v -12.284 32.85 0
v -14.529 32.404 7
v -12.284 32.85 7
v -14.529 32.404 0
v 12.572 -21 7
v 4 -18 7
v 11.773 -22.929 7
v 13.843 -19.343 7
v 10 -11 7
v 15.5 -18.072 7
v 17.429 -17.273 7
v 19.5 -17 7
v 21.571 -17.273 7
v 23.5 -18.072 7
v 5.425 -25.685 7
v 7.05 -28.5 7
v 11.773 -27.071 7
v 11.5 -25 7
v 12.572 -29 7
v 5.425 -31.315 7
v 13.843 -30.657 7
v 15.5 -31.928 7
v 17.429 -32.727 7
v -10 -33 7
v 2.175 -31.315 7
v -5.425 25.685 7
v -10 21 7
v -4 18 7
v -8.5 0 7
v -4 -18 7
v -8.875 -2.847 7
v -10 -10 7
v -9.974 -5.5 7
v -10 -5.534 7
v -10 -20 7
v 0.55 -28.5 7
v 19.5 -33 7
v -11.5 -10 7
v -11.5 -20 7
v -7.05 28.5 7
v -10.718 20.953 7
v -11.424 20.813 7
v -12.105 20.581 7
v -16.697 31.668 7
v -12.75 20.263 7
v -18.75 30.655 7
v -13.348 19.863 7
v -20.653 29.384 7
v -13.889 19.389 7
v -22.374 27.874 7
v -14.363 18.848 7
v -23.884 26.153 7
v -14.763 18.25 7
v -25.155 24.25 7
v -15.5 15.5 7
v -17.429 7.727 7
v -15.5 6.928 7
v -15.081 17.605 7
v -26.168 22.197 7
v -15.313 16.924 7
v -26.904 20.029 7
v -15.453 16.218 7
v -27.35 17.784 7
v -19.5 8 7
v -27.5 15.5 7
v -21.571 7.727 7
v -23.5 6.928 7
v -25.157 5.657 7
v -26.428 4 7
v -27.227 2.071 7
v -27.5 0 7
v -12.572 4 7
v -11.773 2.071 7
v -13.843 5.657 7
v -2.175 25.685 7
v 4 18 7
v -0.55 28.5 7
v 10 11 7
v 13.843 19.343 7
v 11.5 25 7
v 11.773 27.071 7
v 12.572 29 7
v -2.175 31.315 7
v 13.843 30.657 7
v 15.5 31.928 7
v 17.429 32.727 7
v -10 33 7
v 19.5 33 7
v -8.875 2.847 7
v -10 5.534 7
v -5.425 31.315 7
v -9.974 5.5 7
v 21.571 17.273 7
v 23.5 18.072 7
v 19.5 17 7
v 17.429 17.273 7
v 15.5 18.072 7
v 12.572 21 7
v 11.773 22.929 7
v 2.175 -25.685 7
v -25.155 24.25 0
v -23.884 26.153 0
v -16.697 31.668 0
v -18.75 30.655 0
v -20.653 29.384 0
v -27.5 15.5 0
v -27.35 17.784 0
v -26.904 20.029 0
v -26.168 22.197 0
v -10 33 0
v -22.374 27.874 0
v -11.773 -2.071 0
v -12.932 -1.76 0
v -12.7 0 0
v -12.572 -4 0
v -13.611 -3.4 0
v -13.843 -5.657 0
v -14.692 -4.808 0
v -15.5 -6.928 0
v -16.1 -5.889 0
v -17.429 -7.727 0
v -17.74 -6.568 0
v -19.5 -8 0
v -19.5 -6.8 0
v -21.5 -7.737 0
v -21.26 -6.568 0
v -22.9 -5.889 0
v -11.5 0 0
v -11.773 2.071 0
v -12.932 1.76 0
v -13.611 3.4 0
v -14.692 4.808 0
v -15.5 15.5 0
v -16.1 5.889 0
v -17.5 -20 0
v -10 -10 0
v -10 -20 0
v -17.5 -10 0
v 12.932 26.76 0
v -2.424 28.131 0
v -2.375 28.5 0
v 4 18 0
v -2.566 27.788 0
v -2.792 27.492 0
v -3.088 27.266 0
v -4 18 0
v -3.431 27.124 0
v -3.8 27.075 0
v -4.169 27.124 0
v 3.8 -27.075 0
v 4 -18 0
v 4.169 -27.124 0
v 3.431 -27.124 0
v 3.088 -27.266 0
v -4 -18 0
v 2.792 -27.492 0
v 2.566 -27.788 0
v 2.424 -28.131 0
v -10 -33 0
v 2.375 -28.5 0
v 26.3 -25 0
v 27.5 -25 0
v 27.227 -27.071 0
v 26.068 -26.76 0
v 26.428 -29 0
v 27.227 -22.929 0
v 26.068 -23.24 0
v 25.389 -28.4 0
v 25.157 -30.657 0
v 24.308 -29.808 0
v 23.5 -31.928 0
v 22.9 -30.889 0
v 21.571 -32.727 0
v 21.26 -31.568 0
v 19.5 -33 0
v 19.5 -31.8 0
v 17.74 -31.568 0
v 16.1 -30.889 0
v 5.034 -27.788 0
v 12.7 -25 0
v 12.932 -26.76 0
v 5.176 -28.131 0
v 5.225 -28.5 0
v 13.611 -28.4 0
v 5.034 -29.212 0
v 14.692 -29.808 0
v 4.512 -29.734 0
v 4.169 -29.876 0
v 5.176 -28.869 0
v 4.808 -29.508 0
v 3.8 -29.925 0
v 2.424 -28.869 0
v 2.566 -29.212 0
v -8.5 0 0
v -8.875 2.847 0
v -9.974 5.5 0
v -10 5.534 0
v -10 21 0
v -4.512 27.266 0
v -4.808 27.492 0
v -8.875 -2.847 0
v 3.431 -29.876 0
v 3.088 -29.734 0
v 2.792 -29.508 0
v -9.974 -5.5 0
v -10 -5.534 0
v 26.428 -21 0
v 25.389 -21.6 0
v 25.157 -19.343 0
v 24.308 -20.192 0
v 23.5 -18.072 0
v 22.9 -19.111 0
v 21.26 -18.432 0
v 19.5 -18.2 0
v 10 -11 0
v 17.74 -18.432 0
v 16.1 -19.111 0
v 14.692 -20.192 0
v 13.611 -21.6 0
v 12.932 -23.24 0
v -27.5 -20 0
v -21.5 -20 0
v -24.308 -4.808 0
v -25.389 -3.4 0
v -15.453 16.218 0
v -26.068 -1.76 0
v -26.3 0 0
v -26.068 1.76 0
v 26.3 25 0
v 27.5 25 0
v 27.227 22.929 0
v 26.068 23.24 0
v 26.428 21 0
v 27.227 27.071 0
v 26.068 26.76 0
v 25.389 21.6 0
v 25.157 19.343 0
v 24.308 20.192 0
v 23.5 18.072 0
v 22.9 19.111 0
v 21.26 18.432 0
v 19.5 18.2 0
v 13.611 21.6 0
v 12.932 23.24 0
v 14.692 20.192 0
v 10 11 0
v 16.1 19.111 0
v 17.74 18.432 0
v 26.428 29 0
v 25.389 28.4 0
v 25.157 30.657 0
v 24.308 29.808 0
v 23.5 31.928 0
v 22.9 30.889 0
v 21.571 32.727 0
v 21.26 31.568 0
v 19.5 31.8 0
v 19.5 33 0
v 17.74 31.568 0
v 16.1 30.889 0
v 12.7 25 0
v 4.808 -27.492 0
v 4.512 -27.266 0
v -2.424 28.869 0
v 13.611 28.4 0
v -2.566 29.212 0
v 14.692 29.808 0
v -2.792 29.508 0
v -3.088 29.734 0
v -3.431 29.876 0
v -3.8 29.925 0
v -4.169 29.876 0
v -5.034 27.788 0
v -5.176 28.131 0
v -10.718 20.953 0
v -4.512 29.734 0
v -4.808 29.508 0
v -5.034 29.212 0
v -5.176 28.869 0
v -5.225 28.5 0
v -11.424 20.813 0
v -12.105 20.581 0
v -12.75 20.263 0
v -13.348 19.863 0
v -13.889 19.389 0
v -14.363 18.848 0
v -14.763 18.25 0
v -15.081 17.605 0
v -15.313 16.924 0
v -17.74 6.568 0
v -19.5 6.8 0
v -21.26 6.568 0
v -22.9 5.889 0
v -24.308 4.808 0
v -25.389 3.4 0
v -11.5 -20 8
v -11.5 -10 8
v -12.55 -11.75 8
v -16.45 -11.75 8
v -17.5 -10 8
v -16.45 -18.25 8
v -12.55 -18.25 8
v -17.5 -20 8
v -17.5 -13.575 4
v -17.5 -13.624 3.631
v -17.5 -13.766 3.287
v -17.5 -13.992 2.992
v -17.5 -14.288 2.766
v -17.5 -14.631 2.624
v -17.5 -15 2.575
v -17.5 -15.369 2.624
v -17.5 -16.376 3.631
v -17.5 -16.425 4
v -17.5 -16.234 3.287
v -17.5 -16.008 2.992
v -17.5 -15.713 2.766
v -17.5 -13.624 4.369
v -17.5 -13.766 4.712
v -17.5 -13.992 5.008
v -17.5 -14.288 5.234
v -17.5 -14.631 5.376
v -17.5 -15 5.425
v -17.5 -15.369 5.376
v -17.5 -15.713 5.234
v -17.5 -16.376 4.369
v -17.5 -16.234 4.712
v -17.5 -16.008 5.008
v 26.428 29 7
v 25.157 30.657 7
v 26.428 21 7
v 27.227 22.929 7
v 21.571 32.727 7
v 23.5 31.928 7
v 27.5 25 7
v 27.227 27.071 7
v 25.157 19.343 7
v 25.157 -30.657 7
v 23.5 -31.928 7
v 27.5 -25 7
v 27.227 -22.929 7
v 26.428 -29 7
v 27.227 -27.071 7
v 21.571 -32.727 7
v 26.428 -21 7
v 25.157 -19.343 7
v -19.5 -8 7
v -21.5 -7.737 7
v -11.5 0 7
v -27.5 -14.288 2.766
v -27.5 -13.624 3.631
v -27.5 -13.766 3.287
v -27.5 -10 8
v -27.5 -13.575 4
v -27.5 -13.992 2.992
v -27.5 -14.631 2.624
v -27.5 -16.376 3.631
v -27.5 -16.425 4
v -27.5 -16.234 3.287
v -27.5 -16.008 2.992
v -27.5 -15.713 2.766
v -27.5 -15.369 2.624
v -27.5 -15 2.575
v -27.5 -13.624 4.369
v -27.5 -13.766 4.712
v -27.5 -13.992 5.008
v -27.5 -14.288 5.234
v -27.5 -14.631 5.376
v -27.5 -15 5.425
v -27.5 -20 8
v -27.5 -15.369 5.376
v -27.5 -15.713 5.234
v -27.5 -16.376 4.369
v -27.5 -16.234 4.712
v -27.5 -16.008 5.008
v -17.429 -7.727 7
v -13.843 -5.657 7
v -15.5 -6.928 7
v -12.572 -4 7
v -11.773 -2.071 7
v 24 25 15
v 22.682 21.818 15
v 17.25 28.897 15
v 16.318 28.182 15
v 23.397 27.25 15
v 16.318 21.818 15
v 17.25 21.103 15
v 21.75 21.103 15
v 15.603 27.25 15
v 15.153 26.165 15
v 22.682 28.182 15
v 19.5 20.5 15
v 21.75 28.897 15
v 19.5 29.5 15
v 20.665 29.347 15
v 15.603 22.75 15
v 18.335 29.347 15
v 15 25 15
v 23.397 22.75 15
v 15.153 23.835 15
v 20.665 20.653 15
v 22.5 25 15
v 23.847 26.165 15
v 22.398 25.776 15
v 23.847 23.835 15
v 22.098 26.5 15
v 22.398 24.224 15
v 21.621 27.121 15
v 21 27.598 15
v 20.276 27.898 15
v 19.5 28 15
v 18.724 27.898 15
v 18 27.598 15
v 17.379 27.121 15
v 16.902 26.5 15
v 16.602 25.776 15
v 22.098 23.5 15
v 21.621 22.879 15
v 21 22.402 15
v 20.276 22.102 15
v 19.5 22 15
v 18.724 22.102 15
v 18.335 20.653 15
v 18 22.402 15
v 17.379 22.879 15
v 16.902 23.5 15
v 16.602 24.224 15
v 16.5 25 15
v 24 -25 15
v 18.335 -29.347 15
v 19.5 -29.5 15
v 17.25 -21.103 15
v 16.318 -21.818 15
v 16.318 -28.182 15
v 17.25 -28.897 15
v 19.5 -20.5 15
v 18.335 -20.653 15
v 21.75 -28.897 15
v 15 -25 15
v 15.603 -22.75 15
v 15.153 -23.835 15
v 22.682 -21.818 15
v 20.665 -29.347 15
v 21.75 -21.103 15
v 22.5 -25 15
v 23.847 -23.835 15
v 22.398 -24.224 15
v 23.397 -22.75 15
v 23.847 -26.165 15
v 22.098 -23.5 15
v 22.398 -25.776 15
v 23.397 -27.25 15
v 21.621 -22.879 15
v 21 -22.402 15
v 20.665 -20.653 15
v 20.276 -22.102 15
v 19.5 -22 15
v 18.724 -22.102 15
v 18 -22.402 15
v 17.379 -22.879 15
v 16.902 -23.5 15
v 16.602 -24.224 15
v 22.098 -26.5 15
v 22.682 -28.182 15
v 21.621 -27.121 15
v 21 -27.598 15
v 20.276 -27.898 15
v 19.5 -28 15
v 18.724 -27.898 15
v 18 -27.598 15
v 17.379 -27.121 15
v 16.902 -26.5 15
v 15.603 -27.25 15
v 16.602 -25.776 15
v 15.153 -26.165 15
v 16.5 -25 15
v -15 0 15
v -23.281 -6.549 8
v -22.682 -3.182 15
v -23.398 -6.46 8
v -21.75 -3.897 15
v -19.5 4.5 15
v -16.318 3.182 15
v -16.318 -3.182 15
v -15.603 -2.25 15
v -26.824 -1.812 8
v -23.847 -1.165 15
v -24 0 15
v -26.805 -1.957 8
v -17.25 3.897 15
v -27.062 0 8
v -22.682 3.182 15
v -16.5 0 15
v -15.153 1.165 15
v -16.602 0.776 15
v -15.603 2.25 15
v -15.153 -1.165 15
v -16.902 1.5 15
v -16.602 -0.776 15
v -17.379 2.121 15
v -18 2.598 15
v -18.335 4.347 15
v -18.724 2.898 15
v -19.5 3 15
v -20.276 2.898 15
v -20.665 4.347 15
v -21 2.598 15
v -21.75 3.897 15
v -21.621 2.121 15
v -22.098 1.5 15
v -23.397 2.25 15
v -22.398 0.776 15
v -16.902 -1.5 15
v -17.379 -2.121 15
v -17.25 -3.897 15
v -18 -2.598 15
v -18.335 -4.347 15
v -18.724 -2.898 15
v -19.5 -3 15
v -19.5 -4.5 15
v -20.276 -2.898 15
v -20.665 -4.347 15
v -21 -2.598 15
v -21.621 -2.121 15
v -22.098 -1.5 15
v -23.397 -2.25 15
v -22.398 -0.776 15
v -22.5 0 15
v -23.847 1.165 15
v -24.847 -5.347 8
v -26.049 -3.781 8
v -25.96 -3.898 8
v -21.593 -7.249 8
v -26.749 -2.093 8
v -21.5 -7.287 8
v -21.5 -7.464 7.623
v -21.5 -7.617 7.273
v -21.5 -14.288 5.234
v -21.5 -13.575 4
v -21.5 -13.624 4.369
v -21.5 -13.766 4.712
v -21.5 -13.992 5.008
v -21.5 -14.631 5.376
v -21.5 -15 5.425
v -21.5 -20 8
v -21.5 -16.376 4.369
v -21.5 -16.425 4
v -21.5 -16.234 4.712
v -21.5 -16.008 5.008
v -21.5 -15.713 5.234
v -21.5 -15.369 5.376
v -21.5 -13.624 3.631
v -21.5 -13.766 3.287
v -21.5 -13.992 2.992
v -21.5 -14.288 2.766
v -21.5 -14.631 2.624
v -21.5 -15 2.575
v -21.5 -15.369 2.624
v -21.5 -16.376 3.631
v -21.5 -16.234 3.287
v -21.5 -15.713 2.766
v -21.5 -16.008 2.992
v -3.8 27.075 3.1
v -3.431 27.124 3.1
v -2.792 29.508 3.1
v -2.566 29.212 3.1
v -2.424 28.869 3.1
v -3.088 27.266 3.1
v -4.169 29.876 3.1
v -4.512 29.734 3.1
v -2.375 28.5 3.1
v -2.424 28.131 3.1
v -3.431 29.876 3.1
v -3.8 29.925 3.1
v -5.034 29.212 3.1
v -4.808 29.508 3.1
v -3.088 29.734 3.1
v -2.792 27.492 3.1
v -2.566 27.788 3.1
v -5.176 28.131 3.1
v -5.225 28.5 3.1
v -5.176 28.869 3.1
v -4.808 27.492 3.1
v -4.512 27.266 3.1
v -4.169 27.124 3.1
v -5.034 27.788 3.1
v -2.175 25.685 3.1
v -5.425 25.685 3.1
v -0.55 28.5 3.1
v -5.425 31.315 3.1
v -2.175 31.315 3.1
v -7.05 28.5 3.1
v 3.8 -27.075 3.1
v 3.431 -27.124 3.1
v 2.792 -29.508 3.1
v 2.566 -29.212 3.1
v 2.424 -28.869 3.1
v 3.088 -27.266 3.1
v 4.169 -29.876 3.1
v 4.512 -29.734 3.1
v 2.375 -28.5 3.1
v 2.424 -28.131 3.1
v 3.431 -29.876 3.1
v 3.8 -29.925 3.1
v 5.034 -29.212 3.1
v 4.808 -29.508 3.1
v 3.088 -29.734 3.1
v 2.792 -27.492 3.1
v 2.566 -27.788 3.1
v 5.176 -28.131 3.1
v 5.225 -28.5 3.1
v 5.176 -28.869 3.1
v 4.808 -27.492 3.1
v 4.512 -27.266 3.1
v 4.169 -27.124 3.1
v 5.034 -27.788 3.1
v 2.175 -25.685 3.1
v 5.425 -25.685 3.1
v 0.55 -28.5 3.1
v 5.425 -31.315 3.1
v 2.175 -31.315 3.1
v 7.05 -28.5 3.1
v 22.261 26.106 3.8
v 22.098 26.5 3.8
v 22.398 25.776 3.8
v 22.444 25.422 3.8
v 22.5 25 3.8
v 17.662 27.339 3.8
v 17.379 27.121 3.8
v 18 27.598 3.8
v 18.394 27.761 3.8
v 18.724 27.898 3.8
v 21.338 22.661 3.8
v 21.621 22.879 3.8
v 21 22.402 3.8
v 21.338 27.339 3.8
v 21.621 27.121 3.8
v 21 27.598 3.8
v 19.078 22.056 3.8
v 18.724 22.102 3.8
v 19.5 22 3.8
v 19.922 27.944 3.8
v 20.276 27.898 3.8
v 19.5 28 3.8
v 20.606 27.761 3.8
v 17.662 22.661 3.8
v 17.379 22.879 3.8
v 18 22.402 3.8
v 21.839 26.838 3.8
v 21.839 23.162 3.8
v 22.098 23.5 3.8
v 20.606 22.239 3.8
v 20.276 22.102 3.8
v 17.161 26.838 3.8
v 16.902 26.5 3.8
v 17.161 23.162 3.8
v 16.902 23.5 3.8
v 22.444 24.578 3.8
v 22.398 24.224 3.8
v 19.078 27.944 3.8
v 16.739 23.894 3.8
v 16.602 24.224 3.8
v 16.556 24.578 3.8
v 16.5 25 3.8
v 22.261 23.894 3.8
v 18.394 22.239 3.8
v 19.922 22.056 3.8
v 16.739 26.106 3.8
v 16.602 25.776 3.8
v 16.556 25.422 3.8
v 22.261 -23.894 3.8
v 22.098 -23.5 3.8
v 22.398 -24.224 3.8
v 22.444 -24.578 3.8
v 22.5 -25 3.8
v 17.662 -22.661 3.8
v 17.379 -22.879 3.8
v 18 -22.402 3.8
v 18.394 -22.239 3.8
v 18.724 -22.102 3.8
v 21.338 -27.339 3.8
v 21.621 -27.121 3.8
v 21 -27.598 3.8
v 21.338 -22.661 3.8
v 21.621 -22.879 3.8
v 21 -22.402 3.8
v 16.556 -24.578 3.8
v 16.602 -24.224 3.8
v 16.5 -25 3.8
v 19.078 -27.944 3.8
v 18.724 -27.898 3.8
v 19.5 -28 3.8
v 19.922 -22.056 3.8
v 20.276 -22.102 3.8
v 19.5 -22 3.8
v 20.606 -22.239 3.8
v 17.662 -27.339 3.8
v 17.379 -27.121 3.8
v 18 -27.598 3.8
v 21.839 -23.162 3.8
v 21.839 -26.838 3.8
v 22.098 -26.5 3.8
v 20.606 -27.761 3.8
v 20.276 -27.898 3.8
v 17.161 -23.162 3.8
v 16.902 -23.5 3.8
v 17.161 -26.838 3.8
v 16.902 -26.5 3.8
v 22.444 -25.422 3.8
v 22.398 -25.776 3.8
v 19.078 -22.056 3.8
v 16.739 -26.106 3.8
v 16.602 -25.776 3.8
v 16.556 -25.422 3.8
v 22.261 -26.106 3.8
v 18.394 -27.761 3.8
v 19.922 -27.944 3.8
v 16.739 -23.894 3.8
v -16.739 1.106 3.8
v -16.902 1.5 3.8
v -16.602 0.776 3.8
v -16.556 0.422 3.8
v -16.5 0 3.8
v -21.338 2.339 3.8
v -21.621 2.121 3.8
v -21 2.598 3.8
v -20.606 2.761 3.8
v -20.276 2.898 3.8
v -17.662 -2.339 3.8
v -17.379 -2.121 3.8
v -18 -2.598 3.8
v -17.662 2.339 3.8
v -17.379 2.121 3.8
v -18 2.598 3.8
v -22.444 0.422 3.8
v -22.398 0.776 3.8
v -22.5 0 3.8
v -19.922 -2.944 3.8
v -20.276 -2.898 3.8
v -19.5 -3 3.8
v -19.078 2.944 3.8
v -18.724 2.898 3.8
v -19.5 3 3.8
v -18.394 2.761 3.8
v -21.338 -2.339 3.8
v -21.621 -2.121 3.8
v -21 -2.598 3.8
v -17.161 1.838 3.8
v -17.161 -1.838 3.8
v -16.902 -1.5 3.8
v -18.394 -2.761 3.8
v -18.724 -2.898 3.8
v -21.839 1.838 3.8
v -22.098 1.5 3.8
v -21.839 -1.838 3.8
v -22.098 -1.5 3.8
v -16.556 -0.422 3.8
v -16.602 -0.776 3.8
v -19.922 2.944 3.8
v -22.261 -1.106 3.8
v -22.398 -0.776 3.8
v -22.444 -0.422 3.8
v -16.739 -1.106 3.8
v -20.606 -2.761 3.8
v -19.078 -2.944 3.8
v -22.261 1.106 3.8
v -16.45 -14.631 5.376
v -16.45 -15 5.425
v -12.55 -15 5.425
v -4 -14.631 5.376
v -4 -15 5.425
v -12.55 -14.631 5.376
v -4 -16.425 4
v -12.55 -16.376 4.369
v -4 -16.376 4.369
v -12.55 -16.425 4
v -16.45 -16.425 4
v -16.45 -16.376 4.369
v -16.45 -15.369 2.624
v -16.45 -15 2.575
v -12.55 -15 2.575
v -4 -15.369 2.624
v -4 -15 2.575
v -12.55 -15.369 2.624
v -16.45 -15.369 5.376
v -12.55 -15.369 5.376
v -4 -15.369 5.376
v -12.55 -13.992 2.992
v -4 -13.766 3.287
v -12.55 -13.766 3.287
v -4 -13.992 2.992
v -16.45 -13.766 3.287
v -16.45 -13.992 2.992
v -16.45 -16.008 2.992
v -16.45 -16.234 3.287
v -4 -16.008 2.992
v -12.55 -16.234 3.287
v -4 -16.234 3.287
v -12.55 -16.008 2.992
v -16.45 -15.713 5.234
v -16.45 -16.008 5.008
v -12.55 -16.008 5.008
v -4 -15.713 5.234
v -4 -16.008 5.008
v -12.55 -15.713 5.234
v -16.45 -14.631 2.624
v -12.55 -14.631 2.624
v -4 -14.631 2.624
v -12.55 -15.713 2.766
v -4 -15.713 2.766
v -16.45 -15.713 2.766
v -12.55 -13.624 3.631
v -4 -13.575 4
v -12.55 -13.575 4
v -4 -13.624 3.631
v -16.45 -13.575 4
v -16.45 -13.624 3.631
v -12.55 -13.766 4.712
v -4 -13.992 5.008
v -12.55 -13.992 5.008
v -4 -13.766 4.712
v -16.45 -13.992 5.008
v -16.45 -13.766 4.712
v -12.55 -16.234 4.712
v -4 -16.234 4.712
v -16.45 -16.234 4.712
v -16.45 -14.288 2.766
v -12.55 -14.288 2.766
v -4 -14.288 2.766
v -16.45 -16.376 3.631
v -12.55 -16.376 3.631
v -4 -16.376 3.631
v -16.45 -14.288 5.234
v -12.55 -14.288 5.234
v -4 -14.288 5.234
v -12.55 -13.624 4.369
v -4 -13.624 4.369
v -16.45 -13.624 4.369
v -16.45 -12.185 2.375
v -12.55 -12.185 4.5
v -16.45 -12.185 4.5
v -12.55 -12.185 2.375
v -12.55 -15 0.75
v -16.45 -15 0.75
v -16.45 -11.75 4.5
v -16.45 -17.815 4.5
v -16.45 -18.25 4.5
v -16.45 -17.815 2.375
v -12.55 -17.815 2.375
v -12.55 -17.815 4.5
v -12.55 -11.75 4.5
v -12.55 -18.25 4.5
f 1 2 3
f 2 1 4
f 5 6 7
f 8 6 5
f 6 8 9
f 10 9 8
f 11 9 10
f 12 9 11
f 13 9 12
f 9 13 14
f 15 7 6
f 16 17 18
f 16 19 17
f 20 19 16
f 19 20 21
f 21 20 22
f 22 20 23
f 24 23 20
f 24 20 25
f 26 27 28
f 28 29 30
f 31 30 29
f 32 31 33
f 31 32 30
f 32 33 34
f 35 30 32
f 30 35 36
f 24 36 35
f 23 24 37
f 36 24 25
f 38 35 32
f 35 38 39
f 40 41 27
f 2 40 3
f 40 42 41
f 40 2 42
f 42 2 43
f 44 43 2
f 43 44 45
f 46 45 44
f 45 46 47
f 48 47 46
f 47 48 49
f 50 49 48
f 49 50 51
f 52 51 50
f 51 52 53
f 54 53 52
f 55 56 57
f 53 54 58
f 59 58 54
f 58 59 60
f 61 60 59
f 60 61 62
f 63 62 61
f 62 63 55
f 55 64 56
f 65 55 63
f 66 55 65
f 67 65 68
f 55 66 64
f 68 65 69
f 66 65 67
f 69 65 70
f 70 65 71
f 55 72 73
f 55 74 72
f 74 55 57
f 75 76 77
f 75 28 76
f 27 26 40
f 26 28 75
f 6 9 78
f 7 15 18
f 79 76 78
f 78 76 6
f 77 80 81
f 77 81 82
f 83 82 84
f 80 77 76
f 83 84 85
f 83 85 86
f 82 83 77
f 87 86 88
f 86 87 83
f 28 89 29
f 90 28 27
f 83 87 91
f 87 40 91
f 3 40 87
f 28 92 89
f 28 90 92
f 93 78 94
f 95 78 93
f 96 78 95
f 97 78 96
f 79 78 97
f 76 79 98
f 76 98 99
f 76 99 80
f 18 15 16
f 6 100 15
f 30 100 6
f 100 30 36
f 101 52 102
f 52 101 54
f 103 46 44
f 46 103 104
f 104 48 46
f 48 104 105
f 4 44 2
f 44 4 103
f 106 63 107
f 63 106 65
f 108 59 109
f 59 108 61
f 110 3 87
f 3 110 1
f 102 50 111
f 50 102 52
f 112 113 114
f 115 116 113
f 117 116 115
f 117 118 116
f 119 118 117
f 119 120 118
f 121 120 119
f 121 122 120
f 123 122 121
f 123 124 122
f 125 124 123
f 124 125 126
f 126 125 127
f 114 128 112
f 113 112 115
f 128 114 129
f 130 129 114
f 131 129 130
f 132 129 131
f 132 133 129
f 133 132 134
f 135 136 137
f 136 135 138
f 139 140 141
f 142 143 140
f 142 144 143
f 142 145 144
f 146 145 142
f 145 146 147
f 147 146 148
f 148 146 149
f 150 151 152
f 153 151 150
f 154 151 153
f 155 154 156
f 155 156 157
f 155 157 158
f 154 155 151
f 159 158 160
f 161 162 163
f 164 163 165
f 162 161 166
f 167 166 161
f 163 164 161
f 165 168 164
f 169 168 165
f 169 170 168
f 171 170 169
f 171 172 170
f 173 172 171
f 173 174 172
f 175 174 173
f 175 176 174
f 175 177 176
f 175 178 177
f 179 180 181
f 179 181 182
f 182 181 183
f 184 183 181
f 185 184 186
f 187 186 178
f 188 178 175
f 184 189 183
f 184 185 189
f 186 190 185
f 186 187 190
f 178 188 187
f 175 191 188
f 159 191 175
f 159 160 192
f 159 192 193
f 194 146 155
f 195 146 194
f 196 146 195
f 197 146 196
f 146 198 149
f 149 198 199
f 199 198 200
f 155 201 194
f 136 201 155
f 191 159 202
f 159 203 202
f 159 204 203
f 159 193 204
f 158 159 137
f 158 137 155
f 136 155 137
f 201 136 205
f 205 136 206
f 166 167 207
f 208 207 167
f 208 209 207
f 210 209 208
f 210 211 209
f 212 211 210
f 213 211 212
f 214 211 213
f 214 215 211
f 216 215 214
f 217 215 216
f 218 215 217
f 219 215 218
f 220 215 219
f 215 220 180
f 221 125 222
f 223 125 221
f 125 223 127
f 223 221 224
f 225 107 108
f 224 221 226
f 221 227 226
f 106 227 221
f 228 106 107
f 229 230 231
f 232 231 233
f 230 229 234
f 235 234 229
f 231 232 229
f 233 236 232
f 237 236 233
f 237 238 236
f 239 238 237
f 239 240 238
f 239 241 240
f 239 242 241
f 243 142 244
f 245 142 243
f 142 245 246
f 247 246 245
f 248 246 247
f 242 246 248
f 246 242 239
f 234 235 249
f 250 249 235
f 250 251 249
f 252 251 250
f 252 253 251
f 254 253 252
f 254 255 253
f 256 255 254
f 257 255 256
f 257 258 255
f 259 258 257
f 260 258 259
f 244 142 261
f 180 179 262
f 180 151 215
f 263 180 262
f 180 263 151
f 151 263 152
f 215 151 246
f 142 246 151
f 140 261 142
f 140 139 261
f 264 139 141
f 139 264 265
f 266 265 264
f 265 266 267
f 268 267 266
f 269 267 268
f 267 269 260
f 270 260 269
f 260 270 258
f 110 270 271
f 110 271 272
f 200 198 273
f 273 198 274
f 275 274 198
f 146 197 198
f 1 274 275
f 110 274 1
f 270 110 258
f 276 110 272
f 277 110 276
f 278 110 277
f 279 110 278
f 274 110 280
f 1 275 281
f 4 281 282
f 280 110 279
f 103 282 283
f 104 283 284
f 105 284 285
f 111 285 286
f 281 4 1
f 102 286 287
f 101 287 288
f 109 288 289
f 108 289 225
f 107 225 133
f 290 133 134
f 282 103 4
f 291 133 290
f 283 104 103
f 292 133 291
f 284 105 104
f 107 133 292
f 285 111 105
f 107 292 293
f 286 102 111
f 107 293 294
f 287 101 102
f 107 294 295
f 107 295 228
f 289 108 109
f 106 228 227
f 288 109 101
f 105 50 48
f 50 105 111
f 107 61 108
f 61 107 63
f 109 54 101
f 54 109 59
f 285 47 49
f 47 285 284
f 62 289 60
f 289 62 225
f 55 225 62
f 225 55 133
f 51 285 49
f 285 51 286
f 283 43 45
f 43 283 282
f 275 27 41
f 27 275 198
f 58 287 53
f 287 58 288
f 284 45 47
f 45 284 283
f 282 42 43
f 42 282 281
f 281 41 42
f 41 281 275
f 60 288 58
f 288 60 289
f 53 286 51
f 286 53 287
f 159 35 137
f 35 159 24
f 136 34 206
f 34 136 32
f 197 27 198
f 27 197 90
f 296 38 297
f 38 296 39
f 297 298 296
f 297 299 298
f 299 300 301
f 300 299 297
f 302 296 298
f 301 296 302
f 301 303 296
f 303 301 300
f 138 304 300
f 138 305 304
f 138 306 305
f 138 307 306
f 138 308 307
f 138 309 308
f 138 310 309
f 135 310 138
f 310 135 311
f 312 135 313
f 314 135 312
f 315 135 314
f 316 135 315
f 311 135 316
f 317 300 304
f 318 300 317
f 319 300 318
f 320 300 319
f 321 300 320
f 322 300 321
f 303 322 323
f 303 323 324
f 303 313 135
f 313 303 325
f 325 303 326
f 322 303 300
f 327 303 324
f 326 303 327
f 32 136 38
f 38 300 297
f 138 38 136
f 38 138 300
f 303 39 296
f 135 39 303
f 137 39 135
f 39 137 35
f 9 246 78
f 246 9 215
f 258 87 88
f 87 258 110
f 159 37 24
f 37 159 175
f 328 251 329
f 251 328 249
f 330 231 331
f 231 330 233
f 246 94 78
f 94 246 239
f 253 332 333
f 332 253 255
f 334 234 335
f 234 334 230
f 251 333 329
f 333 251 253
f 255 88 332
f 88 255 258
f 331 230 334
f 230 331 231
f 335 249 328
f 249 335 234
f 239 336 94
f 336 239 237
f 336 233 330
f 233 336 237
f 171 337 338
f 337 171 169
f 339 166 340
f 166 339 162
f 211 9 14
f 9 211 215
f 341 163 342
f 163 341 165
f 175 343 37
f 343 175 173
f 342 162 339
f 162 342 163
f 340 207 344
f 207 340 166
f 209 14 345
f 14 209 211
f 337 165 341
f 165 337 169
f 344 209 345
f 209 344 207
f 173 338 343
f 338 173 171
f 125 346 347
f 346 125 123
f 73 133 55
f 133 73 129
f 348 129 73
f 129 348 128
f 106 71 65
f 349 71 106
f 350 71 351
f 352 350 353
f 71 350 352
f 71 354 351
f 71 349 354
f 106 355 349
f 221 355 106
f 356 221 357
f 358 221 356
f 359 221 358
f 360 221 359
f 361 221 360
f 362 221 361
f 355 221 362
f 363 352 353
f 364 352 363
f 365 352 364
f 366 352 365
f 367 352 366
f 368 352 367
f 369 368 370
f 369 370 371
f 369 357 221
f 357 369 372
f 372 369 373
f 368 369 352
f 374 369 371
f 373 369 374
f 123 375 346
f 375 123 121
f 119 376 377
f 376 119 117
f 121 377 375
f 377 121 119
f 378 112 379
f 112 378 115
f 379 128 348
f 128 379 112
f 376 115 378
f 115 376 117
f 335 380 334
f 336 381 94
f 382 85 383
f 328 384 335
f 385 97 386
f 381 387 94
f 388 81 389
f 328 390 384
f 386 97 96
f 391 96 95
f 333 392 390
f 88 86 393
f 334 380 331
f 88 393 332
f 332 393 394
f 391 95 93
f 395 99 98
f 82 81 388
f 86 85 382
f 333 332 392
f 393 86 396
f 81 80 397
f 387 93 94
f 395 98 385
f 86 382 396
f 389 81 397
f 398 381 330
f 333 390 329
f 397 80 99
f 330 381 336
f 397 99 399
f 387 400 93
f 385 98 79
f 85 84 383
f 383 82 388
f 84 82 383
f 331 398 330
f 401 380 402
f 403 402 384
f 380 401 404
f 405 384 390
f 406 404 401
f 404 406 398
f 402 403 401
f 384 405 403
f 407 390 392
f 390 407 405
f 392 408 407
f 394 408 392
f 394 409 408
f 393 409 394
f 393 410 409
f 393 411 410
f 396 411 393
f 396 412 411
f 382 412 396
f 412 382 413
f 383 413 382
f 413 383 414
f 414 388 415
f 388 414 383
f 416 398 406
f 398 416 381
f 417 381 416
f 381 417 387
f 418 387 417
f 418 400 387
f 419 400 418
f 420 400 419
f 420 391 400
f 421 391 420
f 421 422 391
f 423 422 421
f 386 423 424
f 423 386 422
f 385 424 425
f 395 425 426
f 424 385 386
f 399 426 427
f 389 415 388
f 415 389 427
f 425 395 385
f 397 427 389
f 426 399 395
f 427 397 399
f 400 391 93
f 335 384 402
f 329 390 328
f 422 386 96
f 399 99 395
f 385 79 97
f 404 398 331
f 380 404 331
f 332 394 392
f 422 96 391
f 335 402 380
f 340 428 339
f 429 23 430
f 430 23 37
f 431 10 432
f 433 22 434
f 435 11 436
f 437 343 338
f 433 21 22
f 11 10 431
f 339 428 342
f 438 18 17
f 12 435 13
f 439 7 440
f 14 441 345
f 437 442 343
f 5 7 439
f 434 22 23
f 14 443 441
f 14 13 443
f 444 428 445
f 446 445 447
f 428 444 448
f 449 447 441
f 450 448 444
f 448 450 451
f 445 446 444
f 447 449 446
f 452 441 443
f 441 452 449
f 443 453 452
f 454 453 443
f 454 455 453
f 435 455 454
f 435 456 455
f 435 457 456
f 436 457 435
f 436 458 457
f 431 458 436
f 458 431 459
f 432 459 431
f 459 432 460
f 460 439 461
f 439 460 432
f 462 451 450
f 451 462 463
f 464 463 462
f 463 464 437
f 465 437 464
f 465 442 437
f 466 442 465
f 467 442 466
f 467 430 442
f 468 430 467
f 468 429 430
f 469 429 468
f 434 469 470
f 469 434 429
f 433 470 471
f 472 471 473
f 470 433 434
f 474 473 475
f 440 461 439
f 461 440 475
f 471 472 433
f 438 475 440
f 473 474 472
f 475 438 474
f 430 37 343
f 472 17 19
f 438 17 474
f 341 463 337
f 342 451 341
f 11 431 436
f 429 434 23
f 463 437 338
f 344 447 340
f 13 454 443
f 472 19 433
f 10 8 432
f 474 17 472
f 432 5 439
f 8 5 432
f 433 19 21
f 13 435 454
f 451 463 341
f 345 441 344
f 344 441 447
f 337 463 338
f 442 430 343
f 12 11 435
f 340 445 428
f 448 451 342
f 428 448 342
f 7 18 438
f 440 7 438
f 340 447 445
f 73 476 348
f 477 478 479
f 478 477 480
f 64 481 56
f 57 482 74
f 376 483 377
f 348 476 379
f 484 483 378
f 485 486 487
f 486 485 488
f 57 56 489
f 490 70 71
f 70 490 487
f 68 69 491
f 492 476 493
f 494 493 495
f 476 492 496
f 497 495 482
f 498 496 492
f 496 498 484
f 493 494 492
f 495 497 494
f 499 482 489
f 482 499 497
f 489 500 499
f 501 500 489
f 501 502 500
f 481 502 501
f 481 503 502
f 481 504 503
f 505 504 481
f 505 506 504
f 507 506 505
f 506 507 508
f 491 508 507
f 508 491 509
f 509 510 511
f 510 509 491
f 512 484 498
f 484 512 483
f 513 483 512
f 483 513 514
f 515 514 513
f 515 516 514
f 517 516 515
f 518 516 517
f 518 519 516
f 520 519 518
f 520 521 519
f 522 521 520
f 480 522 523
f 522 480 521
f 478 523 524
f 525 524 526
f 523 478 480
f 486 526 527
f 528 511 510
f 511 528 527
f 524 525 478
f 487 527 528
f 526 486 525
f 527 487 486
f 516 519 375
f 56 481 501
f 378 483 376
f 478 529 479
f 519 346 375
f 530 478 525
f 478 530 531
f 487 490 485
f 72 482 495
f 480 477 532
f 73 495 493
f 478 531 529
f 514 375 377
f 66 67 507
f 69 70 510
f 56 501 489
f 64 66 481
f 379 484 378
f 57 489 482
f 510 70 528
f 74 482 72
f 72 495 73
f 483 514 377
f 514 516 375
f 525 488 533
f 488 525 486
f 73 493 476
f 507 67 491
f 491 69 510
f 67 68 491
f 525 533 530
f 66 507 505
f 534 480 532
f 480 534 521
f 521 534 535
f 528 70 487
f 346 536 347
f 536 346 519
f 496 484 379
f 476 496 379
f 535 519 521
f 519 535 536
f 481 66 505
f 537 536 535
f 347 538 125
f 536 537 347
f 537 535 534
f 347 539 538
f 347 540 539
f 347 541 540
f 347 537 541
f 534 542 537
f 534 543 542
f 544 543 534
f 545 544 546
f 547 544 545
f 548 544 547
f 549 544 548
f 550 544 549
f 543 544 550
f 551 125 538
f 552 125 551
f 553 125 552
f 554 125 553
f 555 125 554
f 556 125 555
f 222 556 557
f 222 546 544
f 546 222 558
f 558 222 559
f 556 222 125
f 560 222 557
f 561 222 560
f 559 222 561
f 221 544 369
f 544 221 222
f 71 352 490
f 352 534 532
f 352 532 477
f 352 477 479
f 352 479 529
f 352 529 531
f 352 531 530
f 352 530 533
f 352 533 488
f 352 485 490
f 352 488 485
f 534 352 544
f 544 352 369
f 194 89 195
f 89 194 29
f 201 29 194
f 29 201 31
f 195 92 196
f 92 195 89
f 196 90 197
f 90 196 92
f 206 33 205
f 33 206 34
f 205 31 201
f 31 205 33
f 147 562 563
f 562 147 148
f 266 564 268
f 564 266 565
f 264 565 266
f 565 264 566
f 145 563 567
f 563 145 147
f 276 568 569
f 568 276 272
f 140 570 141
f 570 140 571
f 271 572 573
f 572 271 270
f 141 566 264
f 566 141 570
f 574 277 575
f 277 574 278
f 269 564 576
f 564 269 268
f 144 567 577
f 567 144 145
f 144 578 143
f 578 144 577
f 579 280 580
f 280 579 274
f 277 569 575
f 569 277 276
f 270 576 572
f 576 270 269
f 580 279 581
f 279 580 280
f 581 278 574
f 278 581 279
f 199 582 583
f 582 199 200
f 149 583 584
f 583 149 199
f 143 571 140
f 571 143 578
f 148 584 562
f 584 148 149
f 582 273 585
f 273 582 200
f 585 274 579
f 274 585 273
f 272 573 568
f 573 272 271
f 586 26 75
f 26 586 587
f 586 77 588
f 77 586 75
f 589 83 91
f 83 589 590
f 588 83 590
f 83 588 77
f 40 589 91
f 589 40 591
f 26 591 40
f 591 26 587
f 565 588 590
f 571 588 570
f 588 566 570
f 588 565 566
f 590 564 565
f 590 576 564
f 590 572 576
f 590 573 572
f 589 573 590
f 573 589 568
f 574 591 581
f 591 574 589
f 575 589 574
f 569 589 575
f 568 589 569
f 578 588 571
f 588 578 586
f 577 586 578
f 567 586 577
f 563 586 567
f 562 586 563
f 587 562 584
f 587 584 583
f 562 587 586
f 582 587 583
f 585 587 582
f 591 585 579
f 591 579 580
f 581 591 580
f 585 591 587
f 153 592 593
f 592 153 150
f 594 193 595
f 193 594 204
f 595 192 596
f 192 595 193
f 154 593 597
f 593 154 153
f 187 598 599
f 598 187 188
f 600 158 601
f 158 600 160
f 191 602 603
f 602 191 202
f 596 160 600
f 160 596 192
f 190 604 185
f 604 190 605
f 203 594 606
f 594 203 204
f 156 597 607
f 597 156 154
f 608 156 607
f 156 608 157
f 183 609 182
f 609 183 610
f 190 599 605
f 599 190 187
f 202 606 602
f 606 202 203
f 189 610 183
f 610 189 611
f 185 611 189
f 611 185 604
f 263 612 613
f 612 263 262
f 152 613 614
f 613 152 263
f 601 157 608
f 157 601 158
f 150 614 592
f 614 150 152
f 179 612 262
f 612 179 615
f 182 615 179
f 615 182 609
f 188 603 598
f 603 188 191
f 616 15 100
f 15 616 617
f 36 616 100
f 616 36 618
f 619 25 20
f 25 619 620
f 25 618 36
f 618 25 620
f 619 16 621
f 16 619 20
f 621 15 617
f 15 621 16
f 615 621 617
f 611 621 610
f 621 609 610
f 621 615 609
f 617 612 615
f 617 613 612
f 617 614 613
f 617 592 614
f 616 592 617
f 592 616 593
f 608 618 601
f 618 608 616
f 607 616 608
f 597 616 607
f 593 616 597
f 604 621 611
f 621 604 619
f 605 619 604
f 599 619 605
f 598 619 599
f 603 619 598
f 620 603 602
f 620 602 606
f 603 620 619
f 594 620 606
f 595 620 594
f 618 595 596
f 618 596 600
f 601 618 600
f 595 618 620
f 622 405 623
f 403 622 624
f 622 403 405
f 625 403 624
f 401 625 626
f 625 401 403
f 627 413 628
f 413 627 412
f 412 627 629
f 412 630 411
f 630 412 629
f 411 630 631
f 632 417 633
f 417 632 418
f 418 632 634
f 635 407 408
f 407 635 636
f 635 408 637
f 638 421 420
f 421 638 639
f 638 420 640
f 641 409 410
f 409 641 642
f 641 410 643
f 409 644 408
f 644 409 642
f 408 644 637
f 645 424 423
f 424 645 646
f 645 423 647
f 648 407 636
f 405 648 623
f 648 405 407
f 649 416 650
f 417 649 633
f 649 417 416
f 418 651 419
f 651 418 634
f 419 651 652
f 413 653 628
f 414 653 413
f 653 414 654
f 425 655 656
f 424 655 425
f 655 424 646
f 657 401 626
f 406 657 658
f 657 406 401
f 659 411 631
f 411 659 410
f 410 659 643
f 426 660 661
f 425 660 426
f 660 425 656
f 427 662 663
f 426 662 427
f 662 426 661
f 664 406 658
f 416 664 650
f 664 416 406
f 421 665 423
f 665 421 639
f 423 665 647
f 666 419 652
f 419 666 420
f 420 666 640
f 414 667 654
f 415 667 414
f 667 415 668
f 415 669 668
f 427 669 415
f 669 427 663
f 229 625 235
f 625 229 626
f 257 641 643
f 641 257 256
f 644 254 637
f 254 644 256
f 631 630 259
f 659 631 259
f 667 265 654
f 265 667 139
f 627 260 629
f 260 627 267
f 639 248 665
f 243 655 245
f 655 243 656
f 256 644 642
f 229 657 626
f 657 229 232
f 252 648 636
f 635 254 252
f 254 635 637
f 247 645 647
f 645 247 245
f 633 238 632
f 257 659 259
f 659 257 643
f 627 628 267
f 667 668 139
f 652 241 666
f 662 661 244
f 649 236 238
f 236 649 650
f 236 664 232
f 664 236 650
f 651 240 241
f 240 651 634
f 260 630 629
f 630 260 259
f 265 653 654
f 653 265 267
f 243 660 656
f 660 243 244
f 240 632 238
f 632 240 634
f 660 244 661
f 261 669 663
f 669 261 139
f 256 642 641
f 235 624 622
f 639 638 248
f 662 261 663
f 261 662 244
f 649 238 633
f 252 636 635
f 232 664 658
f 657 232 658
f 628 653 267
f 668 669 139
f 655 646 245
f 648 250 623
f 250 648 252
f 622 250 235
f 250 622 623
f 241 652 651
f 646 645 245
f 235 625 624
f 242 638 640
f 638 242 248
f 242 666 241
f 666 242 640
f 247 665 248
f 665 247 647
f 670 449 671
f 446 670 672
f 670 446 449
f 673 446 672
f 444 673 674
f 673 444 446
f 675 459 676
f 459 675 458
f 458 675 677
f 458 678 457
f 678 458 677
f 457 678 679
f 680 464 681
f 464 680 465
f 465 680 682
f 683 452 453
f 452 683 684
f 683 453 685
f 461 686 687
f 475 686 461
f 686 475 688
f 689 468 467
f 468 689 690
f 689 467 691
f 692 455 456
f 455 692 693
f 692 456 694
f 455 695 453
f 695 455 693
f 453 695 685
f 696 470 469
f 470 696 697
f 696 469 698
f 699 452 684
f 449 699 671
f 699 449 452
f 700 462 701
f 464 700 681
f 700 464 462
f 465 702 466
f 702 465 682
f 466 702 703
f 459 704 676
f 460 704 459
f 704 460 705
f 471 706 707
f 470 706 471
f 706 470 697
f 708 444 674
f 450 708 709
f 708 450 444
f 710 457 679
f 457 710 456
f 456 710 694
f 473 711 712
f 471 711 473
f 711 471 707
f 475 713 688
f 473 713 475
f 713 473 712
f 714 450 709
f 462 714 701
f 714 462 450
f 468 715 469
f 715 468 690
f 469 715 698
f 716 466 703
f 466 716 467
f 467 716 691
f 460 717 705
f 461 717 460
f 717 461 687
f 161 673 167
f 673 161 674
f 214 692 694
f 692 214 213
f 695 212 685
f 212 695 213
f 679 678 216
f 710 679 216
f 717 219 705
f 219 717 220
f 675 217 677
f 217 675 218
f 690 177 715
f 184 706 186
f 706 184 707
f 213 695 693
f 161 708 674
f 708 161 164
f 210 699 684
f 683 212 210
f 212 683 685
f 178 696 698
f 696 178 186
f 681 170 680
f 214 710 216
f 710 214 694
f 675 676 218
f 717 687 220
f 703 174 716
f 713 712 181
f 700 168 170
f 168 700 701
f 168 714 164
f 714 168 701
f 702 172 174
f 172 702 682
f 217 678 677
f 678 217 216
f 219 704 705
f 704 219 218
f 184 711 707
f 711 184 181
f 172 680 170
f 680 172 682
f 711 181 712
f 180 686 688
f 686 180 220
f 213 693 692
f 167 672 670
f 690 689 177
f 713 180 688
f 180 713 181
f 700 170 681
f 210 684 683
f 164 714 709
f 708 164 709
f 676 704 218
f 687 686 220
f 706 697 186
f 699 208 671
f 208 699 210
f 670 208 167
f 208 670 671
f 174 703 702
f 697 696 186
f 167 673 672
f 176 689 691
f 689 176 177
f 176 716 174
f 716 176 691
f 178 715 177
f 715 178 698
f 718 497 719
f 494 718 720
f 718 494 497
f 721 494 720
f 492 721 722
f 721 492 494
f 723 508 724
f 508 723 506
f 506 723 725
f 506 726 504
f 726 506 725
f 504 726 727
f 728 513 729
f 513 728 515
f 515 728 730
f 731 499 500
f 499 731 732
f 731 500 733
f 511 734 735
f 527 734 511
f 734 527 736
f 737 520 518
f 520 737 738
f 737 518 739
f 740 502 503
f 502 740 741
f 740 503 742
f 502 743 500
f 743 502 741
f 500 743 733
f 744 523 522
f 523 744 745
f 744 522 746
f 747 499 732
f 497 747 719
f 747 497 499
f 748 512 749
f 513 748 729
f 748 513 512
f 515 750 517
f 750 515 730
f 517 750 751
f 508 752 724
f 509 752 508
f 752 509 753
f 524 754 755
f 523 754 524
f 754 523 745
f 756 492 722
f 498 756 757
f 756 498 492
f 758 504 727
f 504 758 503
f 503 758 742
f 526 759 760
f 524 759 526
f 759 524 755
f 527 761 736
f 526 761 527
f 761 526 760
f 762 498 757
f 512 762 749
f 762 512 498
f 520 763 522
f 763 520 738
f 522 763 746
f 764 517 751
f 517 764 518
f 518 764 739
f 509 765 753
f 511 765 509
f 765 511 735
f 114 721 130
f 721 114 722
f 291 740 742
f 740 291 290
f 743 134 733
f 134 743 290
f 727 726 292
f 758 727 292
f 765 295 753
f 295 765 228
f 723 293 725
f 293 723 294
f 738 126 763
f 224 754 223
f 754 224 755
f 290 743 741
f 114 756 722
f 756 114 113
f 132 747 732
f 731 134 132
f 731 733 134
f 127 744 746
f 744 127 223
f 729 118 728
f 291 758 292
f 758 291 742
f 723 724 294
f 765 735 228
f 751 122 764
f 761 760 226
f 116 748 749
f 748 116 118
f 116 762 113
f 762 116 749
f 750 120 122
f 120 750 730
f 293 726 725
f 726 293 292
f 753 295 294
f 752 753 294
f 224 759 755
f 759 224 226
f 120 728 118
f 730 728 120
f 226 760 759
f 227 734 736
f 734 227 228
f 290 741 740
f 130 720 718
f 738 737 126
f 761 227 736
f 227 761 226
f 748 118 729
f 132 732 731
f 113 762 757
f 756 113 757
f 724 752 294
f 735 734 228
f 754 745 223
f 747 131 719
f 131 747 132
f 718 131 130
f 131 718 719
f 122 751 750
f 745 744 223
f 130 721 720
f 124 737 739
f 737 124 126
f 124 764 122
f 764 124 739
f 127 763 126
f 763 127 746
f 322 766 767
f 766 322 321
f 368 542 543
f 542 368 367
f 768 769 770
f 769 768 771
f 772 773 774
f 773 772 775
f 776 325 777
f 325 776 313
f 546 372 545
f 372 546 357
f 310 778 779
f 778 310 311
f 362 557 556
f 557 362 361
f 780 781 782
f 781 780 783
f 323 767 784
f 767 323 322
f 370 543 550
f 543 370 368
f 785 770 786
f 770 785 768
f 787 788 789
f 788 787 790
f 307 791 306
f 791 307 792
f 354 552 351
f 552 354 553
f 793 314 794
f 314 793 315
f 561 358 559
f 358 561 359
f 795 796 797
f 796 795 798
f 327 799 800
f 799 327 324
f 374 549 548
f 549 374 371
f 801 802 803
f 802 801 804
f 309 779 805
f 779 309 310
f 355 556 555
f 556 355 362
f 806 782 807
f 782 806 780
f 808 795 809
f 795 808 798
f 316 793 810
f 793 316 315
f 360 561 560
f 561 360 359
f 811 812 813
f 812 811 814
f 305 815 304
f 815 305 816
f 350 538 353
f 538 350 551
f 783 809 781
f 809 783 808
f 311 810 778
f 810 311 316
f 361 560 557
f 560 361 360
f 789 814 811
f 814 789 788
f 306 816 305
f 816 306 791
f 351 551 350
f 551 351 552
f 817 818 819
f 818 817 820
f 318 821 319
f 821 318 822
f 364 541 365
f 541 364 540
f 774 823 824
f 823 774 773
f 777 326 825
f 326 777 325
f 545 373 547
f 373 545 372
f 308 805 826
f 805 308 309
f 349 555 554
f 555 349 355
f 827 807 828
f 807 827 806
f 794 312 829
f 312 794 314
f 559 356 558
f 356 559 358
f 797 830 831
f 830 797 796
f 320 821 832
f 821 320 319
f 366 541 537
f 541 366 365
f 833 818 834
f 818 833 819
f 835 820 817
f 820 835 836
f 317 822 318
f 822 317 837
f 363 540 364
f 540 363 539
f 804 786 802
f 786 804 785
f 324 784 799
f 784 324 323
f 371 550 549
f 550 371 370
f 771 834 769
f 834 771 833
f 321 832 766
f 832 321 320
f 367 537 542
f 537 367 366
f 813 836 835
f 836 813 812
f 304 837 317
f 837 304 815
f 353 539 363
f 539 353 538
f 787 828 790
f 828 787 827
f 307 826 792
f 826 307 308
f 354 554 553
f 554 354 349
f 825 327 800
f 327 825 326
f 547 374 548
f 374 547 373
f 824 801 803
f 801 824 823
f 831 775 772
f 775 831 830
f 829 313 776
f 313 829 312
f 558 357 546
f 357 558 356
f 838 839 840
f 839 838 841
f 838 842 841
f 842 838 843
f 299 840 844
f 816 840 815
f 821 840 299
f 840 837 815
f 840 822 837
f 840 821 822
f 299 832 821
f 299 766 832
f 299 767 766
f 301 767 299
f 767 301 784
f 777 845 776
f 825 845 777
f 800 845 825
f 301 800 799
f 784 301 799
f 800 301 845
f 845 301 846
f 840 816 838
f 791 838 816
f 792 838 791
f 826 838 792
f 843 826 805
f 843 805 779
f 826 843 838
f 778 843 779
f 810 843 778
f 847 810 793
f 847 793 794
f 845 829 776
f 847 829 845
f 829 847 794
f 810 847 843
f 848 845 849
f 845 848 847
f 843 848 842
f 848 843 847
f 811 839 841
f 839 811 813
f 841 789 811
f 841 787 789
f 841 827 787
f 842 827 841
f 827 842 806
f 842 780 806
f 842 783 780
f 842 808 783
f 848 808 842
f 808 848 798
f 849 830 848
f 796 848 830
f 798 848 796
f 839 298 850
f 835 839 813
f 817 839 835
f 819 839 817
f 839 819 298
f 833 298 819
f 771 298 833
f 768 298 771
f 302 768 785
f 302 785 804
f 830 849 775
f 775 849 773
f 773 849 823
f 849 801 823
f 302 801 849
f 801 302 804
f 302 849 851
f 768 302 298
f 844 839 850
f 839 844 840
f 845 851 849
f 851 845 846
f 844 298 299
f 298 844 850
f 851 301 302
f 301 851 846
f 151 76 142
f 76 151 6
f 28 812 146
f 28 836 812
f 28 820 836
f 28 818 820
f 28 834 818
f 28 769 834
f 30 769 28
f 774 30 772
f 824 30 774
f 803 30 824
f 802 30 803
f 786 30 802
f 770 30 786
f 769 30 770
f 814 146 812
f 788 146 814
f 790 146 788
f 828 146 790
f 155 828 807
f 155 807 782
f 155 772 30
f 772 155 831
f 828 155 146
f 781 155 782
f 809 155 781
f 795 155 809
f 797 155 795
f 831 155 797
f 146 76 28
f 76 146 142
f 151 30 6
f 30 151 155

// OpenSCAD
// file: configuration.scad
// Increase this if your slicer or printer make holes too tight.
extra_radius = 0; // 0.1;

// OD = outside diameter, corner to corner.
m3_nut_od = 6.1;
m3_nut_radius = m3_nut_od/2 + 0.2 + extra_radius;
m3_nut_h = 2.4;
m3_nyloc_h = 3.9;
m3_washer_radius = 3.5 + extra_radius;

m4_nut_od = 7.8;
m4_nut_radius = m4_nut_od/2 + 0.2 + extra_radius;
m4_washer_radius = 4.4 + extra_radius;

// Major diameter of metric 3mm thread.
m3_major = 2.85;
m3_radius = m3_major/2 + extra_radius;
m3_wide_radius = m3_major/2 + extra_radius + 0.2;

// Major diameter of metric 4mm thread.
m4_major = 4.85;
m4_radius = m4_major/2 + extra_radius;
m4_wide_radius = m4_major/2 + extra_radius + 0.2;

// M6 Radius
m6_radius = 6/2;

// NEMA17 stepper motors.
motor_shaft_diameter = 5;
motor_shaft_radius = motor_shaft_diameter/2 + extra_radius;

// Frame brackets. M3x8mm screws work best with 3.6 mm brackets.
thickness = 4.0; //3.6 on 1515

// OpenBeam or Misumi. Currently only 15x15 mm, but there is a plan
// to make models more parametric and allow 20x20 mm in the future.
extrusion = 20;

// Placement for the NEMA17 stepper motors.
motor_offset = 44;
motor_length = 47;

separation = 38;  // Distance between ball joint mounting faces.

extrusion_fin_d = 1;

vertex_radius = 40.5; //set to 36 for 1515
vertex_x_offset = 7.25; // offset of the horizontal extrusion to the vertical one in X axis
vertex_y_offset = 39 ;//27; // offset of the horizontal extrusion to the vertical one in Y axis
// main file
include <configuration.scad>;

roller_x = 19.5;
roller_y = 25;
roller_z = 15;
base_radius = 16/2;

width = roller_x*2 + base_radius*2;
height = 66;
thickness = 7;

carriage_width = 20;
center_x = width/2;
center_y = height/2;

shoulder_width = 12;
shoulder_radius = width/2-carriage_width/2;

module carriage_adapter()
{
	difference() {
	union() {
		translate([-carriage_width/2,-height/2,0])
			cube([carriage_width,height,thickness]);
		hull() {
			translate([-carriage_width/2,height/6,0])
				cube([carriage_width,height/3,thickness]);
			translate([roller_x,roller_y,0])
				cylinder(r=base_radius,h=thickness,$fn=24);
		}
		hull() {
			translate([-carriage_width/2,-height/2,0])
				cube([carriage_width,height/3,thickness]);
			translate([roller_x,-roller_y,0])
				cylinder(r=base_radius,h=thickness,$fn=24);
		}
		hull() {
			translate([-width/2,0,0])
				cube([shoulder_width, height/2-shoulder_radius,thickness]);
			translate([-roller_x,0,0])
				cylinder(r=base_radius,h=thickness,$fn=24);
		}

		translate([roller_x,roller_y,thickness])
			cylinder(r1=base_radius,r2=9/2,h=roller_z-thickness,$fn=24);
		translate([roller_x,-roller_y,thickness])
			cylinder(r1=base_radius,r2=9/2,h=roller_z-thickness,$fn=24);
		translate([-roller_x,0,thickness])
			cylinder(r1=base_radius,r2=9/2,h=roller_z-thickness,$fn=24);

		translate([-width/2+shoulder_radius,height/2-shoulder_radius,0])
		difference() {
			cylinder(r=shoulder_radius,h=thickness,$fn=48);
			cylinder(r=shoulder_radius-shoulder_width,h=thickness,$fn=48);
			translate([-shoulder_radius,-shoulder_radius,0])
			cube([shoulder_radius,shoulder_radius,thickness]);
		}

		translate([-width/2+6+4,-height/2+13,0]) {
			cube([6,10,thickness+1]);
			cube([carriage_width,10,thickness]);
		}

		translate([-width/2, -height/2+13, 0])
			cube([6,height/2-10,thickness]);
		hull() {
			translate([-width/2, -height/2+13,0])
				cube([6,10,thickness+1]);
			intersection() {
				translate([-roller_x,0,thickness])
					cylinder(r1=base_radius,r2=9/2,h=roller_z-thickness,$fn=24);
				translate([-width/2, -height/2+13,0])
					cube([6,height/2-13,thickness+1]);
			}
		}
	}
	// DIFFERENCE

		translate([-4, -18, 0])
			cube([8, 36, thickness]);

		intersection() {
			translate([-roller_x, 0, 0])
				cylinder(r=base_radius+3, h=thickness, $fn=24);
			translate([-carriage_width/2,-height/2,0])
				cube([carriage_width, height, thickness]);
		}

		for(a=[0,180]) rotate([0,0,a]) {
		translate([-carriage_width/4+1.2,height/2-4.5,0])
		{
			cylinder(r=m3_radius,h=20,$fn=24);
			translate([0, 0, thickness-m3_nyloc_h])
			cylinder(r=m3_nut_radius,h=m3_nyloc_h+1,$fn=6);
		}
		}

		translate([roller_x,roller_y,0]) {
			cylinder(r=m6_radius,h=20,$fn=24);
			cylinder(r1=12/2+0.8, r2=2/2+0.8,h=5,$fn=24);
		}
		translate([roller_x,-roller_y,0]) {
			cylinder(r=m6_radius,h=20,$fn=24);
			cylinder(r1=12/2+0.8, r2=2/2+0.8,h=5,$fn=24);
		}
		translate([-roller_x,0,0]) {
			cylinder(r=m6_radius,h=20,$fn=24);
			cylinder(r1=12/2+0.8, r2=2/2+0.8,h=5,$fn=24);
		}

		translate([-width/2, -height/2+13, 0]) {
		translate([-1, 10/2, (thickness+1)/2])
			rotate([0,90,0])
				cylinder(r=m3_radius, h=width/2, $fn=24);

		translate([6+4+6/2, 10/2, (thickness+1)/2])
		rotate([0,90,0])
			cylinder(r=m3_nut_radius, h=m3_nyloc_h, center=true, $fn=6);
		translate([6+4+6/2, 10/2, (thickness+2)*3/4]) 
			cube([m3_nyloc_h, m3_nut_radius*2, (thickness+2)/2], center=true);
		}			
	}
}

carriage_adapter();
